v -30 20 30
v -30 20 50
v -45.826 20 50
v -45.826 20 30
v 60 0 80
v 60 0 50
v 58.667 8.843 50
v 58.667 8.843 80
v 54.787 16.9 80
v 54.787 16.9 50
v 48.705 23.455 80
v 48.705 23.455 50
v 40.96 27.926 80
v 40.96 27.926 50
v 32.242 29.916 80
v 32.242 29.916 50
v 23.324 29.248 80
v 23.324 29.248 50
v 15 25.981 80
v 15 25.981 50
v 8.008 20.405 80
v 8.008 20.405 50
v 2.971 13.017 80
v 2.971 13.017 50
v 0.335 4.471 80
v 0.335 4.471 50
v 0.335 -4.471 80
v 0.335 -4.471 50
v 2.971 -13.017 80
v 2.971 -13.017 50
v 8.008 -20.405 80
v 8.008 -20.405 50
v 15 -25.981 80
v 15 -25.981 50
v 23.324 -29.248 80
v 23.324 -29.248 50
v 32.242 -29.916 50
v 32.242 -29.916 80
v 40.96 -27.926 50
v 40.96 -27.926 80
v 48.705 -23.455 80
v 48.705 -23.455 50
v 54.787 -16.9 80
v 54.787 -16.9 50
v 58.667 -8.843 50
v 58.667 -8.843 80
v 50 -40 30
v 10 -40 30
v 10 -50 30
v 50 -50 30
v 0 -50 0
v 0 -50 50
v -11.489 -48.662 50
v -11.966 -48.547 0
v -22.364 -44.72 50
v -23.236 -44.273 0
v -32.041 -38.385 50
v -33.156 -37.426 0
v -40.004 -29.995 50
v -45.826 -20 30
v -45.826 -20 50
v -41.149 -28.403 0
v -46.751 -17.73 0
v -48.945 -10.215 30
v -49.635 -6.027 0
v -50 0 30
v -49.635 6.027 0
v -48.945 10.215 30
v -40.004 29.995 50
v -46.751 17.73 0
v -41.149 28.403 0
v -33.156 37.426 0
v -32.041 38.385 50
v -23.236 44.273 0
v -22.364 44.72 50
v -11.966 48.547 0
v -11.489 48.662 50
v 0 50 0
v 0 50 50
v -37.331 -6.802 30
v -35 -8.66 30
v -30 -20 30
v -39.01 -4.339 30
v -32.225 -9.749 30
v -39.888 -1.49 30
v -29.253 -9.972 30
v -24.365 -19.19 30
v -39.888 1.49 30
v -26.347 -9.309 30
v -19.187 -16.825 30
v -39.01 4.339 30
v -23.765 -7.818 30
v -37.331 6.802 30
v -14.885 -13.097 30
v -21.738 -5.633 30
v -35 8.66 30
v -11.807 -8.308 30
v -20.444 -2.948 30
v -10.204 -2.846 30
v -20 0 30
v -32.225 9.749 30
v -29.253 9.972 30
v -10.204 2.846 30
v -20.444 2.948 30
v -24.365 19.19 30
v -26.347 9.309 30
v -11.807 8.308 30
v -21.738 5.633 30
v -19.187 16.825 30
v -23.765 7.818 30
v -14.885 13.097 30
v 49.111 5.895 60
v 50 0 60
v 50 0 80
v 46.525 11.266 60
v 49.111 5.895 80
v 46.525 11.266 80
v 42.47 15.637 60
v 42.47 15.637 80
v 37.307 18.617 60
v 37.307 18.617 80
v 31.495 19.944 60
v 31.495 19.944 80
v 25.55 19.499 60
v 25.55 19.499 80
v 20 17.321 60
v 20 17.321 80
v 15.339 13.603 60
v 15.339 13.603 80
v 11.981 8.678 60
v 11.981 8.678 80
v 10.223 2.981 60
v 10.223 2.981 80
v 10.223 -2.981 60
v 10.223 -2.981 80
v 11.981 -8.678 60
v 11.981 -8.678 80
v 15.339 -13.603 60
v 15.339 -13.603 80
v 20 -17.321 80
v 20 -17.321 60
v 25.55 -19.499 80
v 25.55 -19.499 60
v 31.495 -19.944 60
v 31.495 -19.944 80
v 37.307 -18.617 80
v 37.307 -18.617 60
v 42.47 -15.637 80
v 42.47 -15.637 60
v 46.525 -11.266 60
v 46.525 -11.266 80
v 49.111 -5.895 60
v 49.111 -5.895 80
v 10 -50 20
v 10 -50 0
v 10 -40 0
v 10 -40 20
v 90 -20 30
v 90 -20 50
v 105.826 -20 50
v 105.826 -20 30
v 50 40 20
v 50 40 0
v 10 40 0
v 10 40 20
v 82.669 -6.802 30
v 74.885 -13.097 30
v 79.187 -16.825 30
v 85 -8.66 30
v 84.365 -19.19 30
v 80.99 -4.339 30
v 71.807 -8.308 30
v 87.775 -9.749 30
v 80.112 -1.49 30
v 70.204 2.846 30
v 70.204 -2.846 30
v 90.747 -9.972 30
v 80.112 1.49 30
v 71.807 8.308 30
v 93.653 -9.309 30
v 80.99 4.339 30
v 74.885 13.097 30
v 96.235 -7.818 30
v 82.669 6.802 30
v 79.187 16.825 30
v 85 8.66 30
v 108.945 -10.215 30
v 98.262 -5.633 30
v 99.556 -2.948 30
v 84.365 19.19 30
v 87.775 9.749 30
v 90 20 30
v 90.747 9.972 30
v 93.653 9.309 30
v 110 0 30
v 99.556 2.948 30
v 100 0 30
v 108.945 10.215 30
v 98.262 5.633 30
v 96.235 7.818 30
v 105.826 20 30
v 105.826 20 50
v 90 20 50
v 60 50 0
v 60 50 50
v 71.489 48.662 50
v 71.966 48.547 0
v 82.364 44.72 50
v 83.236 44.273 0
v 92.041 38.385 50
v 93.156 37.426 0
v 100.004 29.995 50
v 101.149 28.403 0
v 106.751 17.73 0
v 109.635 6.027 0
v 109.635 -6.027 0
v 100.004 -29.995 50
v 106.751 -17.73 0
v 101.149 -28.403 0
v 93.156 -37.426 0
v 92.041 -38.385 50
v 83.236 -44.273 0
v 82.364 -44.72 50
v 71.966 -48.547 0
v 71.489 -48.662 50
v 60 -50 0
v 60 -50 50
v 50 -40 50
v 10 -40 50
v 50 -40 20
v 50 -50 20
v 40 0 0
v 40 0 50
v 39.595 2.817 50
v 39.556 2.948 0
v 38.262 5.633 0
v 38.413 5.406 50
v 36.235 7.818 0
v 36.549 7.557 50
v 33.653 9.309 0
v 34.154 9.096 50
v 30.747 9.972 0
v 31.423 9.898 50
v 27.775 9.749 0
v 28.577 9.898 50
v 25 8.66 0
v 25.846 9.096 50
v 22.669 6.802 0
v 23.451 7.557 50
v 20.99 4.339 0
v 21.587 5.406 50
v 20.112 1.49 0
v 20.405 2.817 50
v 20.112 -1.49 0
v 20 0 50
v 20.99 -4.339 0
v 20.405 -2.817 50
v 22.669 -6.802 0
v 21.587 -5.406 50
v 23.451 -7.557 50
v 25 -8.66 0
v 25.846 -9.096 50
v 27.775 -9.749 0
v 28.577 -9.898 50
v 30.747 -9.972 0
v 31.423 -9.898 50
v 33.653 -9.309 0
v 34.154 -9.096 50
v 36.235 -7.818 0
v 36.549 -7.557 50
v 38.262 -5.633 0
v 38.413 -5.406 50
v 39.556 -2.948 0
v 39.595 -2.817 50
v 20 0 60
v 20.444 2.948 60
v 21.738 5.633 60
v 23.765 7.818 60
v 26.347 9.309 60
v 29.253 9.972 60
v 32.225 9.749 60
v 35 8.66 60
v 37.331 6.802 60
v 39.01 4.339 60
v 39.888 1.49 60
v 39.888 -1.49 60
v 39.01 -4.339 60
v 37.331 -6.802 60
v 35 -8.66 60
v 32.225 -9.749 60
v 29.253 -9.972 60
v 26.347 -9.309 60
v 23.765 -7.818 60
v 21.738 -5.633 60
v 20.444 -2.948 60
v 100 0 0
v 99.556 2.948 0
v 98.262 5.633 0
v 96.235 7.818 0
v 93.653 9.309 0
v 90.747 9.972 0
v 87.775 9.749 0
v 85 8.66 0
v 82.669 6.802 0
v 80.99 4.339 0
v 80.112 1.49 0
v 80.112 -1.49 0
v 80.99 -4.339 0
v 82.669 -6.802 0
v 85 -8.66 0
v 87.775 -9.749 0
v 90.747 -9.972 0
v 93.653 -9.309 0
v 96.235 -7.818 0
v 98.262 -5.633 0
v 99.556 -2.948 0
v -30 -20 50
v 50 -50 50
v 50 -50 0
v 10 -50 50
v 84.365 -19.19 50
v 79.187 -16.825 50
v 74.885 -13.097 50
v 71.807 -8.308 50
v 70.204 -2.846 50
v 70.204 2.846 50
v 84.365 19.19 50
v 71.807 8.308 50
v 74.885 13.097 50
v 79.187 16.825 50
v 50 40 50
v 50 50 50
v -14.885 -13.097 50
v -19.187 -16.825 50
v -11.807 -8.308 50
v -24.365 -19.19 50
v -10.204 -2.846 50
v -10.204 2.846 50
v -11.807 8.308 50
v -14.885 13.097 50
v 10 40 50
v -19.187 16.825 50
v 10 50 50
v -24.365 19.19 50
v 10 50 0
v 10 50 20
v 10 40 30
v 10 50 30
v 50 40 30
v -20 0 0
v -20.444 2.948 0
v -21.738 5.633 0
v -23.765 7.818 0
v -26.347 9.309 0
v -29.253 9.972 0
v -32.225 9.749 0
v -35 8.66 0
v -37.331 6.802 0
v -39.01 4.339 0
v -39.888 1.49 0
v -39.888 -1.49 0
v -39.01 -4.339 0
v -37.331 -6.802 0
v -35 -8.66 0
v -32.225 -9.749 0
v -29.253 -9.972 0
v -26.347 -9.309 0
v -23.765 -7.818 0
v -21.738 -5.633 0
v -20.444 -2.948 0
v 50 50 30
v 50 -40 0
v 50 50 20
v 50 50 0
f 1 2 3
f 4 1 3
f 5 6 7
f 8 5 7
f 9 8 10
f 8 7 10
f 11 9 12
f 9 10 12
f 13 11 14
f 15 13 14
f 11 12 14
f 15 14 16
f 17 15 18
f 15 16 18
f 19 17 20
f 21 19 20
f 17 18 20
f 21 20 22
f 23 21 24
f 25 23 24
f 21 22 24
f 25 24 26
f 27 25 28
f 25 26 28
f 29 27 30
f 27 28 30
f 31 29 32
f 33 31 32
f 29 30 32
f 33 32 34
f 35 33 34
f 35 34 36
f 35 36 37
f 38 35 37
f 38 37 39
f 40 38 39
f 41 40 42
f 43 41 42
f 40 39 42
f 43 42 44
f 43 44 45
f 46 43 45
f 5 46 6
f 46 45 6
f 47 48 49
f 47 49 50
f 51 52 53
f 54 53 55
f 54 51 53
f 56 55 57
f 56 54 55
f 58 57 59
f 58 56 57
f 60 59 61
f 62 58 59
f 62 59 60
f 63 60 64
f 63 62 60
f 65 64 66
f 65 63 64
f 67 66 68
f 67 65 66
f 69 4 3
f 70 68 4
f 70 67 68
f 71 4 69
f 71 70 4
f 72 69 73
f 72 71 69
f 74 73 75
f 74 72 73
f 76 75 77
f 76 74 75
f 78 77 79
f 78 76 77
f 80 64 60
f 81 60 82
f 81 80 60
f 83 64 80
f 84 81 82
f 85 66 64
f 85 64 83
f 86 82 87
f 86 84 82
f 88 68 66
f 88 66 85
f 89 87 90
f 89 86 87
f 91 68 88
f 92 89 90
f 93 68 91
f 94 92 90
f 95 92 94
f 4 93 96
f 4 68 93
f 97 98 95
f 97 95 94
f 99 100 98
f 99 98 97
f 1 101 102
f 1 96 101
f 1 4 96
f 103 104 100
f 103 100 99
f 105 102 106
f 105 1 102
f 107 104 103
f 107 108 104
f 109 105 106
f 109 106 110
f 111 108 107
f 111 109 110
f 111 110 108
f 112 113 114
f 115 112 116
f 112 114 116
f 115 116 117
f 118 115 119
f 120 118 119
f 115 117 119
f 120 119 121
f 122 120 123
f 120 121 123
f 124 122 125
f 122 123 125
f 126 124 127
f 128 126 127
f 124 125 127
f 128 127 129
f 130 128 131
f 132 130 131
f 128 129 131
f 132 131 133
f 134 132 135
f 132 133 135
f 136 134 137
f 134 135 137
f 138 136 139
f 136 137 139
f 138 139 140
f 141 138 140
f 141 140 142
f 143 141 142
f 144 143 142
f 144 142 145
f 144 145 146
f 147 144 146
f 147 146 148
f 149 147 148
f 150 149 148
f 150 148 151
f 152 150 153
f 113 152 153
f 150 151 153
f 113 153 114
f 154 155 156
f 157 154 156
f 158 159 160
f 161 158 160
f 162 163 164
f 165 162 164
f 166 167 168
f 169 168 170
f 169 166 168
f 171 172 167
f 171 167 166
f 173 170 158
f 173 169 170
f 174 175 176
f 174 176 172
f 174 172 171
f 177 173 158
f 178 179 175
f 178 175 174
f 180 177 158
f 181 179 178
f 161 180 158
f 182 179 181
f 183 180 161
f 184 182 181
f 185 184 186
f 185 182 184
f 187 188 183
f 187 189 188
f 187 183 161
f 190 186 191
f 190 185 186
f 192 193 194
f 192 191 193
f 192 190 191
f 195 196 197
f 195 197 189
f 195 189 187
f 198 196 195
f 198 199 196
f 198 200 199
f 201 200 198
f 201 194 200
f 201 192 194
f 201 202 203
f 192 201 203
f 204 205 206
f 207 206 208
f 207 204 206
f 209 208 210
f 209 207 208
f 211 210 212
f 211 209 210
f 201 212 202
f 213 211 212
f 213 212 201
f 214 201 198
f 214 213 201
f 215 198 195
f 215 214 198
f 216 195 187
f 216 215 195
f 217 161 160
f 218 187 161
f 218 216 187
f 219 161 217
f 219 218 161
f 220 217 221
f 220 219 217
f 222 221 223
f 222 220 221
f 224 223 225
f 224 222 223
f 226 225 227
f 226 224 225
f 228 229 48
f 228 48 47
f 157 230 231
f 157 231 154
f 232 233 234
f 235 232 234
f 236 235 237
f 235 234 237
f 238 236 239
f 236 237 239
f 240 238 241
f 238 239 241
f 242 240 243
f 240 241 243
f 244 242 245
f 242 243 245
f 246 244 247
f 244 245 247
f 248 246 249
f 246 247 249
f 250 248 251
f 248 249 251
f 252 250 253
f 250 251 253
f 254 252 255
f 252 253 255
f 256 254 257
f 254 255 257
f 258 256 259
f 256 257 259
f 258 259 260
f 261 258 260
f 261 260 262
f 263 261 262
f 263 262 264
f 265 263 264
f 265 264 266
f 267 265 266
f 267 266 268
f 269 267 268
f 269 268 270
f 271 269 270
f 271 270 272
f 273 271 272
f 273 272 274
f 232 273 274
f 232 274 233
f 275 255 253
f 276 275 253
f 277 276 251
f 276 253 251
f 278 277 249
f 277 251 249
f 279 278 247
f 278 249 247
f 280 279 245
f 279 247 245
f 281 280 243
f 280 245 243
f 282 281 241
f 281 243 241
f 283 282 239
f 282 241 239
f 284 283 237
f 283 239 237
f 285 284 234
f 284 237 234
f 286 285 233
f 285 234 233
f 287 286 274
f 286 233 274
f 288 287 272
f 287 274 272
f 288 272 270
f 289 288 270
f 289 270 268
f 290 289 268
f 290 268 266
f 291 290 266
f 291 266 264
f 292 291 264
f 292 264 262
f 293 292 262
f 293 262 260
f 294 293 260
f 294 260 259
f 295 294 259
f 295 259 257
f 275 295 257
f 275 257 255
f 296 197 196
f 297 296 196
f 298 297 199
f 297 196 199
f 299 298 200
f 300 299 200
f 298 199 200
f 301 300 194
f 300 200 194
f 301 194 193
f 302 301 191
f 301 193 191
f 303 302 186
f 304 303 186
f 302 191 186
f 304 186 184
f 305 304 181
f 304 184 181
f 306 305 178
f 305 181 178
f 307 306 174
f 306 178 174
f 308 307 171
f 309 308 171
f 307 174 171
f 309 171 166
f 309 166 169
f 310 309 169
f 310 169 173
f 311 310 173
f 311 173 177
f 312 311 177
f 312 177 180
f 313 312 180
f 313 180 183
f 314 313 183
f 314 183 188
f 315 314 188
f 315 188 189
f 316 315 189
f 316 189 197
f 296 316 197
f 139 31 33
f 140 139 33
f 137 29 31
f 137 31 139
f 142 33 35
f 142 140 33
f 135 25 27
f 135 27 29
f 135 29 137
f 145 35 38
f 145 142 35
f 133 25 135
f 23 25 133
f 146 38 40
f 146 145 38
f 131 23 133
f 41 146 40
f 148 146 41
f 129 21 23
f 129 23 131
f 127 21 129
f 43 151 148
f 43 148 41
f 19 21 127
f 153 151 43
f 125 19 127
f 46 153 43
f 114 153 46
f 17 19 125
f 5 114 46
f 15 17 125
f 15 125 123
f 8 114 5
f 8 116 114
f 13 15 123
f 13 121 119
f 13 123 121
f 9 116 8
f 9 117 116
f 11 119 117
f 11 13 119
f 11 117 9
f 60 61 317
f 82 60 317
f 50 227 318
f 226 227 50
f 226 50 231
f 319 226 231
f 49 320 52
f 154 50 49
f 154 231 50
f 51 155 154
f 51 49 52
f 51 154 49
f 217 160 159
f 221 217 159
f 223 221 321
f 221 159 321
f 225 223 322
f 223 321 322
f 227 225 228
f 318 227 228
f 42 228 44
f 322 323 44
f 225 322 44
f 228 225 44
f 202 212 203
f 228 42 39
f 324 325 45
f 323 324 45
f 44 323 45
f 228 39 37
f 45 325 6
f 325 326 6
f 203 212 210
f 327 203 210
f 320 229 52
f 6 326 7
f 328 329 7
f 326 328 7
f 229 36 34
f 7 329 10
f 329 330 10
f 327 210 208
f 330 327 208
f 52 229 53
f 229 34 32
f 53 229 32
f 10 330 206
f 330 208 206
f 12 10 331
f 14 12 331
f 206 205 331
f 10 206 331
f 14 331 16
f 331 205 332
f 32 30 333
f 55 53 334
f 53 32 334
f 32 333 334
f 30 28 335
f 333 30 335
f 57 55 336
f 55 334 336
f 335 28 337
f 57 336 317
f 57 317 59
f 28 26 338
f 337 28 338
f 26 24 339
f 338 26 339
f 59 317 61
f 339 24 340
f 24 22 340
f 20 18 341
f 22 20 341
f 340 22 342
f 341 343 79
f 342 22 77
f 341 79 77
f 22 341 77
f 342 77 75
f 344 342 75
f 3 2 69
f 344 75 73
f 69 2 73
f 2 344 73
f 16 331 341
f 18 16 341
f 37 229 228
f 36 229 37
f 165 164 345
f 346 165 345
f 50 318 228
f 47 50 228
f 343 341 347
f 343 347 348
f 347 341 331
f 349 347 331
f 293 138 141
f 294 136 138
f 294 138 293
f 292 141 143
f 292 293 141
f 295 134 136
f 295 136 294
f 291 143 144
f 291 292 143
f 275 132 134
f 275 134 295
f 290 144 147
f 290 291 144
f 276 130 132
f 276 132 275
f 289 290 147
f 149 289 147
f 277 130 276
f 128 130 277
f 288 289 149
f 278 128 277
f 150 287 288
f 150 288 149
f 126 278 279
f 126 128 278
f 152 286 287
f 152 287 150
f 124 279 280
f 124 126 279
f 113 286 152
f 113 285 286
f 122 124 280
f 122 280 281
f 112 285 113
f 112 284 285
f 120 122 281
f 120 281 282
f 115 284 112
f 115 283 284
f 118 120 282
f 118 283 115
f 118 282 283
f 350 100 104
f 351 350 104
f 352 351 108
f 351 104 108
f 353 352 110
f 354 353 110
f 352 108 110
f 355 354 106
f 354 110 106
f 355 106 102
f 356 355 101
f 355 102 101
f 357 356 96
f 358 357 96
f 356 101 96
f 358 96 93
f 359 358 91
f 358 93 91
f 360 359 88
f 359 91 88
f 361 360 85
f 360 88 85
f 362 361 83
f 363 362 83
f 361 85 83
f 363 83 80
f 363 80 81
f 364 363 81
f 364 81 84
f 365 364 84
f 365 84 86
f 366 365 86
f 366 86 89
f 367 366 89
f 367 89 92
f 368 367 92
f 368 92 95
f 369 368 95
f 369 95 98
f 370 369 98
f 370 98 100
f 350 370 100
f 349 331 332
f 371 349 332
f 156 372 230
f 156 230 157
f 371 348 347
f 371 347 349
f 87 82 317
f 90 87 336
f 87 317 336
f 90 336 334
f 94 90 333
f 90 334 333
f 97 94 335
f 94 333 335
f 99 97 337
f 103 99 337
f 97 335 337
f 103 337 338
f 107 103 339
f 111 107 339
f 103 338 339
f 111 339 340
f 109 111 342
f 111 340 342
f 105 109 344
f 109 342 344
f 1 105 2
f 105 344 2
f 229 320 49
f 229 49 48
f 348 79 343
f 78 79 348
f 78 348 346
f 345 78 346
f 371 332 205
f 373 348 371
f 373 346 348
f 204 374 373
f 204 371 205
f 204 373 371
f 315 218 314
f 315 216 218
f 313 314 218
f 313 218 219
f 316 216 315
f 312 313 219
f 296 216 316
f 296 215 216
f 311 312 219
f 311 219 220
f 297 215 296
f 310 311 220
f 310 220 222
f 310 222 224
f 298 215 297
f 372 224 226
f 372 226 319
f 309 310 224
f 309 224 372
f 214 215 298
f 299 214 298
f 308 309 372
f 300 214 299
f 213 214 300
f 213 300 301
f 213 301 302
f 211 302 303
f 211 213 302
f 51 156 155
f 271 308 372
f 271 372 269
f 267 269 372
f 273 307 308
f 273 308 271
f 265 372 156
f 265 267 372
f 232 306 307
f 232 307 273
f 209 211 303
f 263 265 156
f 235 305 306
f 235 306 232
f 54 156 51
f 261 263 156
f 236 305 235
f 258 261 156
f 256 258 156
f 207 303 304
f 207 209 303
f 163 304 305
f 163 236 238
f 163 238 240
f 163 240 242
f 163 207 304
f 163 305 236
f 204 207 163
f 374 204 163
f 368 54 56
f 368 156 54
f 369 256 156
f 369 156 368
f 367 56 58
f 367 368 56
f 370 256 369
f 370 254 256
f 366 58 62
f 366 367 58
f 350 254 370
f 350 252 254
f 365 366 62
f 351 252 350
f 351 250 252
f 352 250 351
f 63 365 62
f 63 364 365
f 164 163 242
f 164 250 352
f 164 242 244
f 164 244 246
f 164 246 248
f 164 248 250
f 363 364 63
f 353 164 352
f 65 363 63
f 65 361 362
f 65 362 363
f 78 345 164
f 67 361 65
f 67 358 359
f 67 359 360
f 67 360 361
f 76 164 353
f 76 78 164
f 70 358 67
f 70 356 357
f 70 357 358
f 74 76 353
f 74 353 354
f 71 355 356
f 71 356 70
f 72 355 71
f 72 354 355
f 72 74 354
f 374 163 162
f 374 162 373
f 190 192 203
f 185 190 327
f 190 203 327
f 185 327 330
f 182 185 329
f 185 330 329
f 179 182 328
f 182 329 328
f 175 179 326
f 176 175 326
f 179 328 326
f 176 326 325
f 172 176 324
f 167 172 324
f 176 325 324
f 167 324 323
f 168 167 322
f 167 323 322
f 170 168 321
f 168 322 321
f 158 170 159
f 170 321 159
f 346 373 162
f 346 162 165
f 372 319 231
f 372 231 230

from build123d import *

# Parameters (mm, degrees)
BOSS_EXTRUDE1_DEPTH = 50
SKETCH2_R           = 10
CUT_EXTRUDE1_DEPTH  = 50
SKETCH3_R           = 30
BOSS_EXTRUDE2_DEPTH = 30
SKETCH4_R           = 20
CUT_EXTRUDE2_DEPTH  = 20
SKETCH5_R           = 10
CUT_EXTRUDE3_DEPTH  = 20
SKETCH6_W           = 40
SKETCH6_H           = 10
CUT_EXTRUDE4_DEPTH  = 20
SKETCH7_W           = 40
SKETCH7_H           = 10
CUT_EXTRUDE5_DEPTH  = 20
SKETCH8_W           = 40
SKETCH8_H           = 10
CUT_EXTRUDE6_DEPTH  = 20
SKETCH9_W           = 40
SKETCH9_H           = 10
CUT_EXTRUDE7_DEPTH  = 20
SKETCH10_R          = 10
CUT_EXTRUDE8_DEPTH  = 60
SKETCH11_R          = 10
CUT_EXTRUDE9_DEPTH  = 20


with BuildPart() as part:
    # Sketch1 → Boss-Extrude1 (new body)
    with BuildSketch(Plane.XY):
        with BuildLine():
            Line((0, 50), (60, 50))
            ThreePointArc((60, 50), (110, 0), (60, -50))
            Line((60, -50), (0, -50))
            ThreePointArc((0, -50), (-50, 0), (0, 50))
        make_face()
    extrude(amount=BOSS_EXTRUDE1_DEPTH)

    # Sketch2 → Cut-Extrude1 (cut)
    with BuildSketch(Plane.XY.offset(50)):
        with Locations((30, 0)):
            Circle(SKETCH2_R)
    extrude(amount=-CUT_EXTRUDE1_DEPTH, mode=Mode.SUBTRACT)

    # Sketch3 → Boss-Extrude2 (add)
    with BuildSketch(Plane.XY.offset(50)):
        with Locations((30, 0)):
            Circle(SKETCH3_R)
    extrude(amount=BOSS_EXTRUDE2_DEPTH)

    # Sketch4 → Cut-Extrude2 (cut)
    with BuildSketch(Plane.XY.offset(80)):
        with Locations((30, 0)):
            Circle(SKETCH4_R)
    extrude(amount=-CUT_EXTRUDE2_DEPTH, mode=Mode.SUBTRACT)

    # Sketch5 → Cut-Extrude3 (cut)
    with BuildSketch(Plane(origin=(0, 0, 50), x_dir=(-1, 0, 0), z_dir=(0, 0, -1))):
        with Locations((-30, 0)):
            Circle(SKETCH5_R)
    extrude(amount=-CUT_EXTRUDE3_DEPTH, mode=Mode.SUBTRACT)

    # Sketch6 → Cut-Extrude4 (cut)
    with BuildSketch(Plane.XY.offset(50)):
        with Locations((30, 45)):
            Rectangle(SKETCH6_W, SKETCH6_H)
    extrude(amount=-CUT_EXTRUDE4_DEPTH, mode=Mode.SUBTRACT)

    # Sketch7 → Cut-Extrude5 (cut)
    with BuildSketch(Plane(origin=(0, 0, 0), x_dir=(-1, 0, 0), z_dir=(0, 0, -1))):
        with Locations((-30, 45)):
            Rectangle(SKETCH7_W, SKETCH7_H)
    extrude(amount=-CUT_EXTRUDE5_DEPTH, mode=Mode.SUBTRACT)

    # Sketch8 → Cut-Extrude6 (cut)
    with BuildSketch(Plane.XY.offset(50)):
        with Locations((30, -45)):
            Rectangle(SKETCH8_W, SKETCH8_H)
    extrude(amount=-CUT_EXTRUDE6_DEPTH, mode=Mode.SUBTRACT)

    # Sketch9 → Cut-Extrude7 (cut)
    with BuildSketch(Plane(origin=(0, 0, 0), x_dir=(-1, 0, 0), z_dir=(0, 0, -1))):
        with Locations((-30, -45)):
            Rectangle(SKETCH9_W, SKETCH9_H)
    extrude(amount=-CUT_EXTRUDE7_DEPTH, mode=Mode.SUBTRACT)

    # Sketch10 → Cut-Extrude8 (cut)
    with BuildSketch(Plane.XY.offset(50)):
        with Locations((-30, 0)):
            Circle(SKETCH10_R)
        with Locations((90, 0)):
            Circle(SKETCH10_R)
    extrude(amount=-CUT_EXTRUDE8_DEPTH, mode=Mode.SUBTRACT)

    # Sketch11 → Cut-Extrude9 (cut)
    with BuildSketch(Plane.XY.offset(50)):
        with BuildLine():
            ThreePointArc((-30, -20), (-10, 0), (-30, 20))
            Line((-30, 20), (-45.82575695, 20))
            ThreePointArc((-45.82575695, 20), (-50, 0), (-45.82575695, -20))
            Line((-45.82575695, -20), (-30, -20))
        make_face()
        with Locations((-30, 0)):
            Circle(SKETCH11_R, mode=Mode.SUBTRACT)
        with BuildLine():
            Line((105.82575695, 20), (90, 20))
            ThreePointArc((90, 20), (70, 0), (90, -20))
            Line((90, -20), (105.82575695, -20))
            ThreePointArc((105.82575695, -20), (110, 0), (105.82575695, 20))
        make_face()
        with Locations((90, 0)):
            Circle(SKETCH11_R, mode=Mode.SUBTRACT)
    extrude(amount=-CUT_EXTRUDE9_DEPTH, mode=Mode.SUBTRACT)


solid = part.part
